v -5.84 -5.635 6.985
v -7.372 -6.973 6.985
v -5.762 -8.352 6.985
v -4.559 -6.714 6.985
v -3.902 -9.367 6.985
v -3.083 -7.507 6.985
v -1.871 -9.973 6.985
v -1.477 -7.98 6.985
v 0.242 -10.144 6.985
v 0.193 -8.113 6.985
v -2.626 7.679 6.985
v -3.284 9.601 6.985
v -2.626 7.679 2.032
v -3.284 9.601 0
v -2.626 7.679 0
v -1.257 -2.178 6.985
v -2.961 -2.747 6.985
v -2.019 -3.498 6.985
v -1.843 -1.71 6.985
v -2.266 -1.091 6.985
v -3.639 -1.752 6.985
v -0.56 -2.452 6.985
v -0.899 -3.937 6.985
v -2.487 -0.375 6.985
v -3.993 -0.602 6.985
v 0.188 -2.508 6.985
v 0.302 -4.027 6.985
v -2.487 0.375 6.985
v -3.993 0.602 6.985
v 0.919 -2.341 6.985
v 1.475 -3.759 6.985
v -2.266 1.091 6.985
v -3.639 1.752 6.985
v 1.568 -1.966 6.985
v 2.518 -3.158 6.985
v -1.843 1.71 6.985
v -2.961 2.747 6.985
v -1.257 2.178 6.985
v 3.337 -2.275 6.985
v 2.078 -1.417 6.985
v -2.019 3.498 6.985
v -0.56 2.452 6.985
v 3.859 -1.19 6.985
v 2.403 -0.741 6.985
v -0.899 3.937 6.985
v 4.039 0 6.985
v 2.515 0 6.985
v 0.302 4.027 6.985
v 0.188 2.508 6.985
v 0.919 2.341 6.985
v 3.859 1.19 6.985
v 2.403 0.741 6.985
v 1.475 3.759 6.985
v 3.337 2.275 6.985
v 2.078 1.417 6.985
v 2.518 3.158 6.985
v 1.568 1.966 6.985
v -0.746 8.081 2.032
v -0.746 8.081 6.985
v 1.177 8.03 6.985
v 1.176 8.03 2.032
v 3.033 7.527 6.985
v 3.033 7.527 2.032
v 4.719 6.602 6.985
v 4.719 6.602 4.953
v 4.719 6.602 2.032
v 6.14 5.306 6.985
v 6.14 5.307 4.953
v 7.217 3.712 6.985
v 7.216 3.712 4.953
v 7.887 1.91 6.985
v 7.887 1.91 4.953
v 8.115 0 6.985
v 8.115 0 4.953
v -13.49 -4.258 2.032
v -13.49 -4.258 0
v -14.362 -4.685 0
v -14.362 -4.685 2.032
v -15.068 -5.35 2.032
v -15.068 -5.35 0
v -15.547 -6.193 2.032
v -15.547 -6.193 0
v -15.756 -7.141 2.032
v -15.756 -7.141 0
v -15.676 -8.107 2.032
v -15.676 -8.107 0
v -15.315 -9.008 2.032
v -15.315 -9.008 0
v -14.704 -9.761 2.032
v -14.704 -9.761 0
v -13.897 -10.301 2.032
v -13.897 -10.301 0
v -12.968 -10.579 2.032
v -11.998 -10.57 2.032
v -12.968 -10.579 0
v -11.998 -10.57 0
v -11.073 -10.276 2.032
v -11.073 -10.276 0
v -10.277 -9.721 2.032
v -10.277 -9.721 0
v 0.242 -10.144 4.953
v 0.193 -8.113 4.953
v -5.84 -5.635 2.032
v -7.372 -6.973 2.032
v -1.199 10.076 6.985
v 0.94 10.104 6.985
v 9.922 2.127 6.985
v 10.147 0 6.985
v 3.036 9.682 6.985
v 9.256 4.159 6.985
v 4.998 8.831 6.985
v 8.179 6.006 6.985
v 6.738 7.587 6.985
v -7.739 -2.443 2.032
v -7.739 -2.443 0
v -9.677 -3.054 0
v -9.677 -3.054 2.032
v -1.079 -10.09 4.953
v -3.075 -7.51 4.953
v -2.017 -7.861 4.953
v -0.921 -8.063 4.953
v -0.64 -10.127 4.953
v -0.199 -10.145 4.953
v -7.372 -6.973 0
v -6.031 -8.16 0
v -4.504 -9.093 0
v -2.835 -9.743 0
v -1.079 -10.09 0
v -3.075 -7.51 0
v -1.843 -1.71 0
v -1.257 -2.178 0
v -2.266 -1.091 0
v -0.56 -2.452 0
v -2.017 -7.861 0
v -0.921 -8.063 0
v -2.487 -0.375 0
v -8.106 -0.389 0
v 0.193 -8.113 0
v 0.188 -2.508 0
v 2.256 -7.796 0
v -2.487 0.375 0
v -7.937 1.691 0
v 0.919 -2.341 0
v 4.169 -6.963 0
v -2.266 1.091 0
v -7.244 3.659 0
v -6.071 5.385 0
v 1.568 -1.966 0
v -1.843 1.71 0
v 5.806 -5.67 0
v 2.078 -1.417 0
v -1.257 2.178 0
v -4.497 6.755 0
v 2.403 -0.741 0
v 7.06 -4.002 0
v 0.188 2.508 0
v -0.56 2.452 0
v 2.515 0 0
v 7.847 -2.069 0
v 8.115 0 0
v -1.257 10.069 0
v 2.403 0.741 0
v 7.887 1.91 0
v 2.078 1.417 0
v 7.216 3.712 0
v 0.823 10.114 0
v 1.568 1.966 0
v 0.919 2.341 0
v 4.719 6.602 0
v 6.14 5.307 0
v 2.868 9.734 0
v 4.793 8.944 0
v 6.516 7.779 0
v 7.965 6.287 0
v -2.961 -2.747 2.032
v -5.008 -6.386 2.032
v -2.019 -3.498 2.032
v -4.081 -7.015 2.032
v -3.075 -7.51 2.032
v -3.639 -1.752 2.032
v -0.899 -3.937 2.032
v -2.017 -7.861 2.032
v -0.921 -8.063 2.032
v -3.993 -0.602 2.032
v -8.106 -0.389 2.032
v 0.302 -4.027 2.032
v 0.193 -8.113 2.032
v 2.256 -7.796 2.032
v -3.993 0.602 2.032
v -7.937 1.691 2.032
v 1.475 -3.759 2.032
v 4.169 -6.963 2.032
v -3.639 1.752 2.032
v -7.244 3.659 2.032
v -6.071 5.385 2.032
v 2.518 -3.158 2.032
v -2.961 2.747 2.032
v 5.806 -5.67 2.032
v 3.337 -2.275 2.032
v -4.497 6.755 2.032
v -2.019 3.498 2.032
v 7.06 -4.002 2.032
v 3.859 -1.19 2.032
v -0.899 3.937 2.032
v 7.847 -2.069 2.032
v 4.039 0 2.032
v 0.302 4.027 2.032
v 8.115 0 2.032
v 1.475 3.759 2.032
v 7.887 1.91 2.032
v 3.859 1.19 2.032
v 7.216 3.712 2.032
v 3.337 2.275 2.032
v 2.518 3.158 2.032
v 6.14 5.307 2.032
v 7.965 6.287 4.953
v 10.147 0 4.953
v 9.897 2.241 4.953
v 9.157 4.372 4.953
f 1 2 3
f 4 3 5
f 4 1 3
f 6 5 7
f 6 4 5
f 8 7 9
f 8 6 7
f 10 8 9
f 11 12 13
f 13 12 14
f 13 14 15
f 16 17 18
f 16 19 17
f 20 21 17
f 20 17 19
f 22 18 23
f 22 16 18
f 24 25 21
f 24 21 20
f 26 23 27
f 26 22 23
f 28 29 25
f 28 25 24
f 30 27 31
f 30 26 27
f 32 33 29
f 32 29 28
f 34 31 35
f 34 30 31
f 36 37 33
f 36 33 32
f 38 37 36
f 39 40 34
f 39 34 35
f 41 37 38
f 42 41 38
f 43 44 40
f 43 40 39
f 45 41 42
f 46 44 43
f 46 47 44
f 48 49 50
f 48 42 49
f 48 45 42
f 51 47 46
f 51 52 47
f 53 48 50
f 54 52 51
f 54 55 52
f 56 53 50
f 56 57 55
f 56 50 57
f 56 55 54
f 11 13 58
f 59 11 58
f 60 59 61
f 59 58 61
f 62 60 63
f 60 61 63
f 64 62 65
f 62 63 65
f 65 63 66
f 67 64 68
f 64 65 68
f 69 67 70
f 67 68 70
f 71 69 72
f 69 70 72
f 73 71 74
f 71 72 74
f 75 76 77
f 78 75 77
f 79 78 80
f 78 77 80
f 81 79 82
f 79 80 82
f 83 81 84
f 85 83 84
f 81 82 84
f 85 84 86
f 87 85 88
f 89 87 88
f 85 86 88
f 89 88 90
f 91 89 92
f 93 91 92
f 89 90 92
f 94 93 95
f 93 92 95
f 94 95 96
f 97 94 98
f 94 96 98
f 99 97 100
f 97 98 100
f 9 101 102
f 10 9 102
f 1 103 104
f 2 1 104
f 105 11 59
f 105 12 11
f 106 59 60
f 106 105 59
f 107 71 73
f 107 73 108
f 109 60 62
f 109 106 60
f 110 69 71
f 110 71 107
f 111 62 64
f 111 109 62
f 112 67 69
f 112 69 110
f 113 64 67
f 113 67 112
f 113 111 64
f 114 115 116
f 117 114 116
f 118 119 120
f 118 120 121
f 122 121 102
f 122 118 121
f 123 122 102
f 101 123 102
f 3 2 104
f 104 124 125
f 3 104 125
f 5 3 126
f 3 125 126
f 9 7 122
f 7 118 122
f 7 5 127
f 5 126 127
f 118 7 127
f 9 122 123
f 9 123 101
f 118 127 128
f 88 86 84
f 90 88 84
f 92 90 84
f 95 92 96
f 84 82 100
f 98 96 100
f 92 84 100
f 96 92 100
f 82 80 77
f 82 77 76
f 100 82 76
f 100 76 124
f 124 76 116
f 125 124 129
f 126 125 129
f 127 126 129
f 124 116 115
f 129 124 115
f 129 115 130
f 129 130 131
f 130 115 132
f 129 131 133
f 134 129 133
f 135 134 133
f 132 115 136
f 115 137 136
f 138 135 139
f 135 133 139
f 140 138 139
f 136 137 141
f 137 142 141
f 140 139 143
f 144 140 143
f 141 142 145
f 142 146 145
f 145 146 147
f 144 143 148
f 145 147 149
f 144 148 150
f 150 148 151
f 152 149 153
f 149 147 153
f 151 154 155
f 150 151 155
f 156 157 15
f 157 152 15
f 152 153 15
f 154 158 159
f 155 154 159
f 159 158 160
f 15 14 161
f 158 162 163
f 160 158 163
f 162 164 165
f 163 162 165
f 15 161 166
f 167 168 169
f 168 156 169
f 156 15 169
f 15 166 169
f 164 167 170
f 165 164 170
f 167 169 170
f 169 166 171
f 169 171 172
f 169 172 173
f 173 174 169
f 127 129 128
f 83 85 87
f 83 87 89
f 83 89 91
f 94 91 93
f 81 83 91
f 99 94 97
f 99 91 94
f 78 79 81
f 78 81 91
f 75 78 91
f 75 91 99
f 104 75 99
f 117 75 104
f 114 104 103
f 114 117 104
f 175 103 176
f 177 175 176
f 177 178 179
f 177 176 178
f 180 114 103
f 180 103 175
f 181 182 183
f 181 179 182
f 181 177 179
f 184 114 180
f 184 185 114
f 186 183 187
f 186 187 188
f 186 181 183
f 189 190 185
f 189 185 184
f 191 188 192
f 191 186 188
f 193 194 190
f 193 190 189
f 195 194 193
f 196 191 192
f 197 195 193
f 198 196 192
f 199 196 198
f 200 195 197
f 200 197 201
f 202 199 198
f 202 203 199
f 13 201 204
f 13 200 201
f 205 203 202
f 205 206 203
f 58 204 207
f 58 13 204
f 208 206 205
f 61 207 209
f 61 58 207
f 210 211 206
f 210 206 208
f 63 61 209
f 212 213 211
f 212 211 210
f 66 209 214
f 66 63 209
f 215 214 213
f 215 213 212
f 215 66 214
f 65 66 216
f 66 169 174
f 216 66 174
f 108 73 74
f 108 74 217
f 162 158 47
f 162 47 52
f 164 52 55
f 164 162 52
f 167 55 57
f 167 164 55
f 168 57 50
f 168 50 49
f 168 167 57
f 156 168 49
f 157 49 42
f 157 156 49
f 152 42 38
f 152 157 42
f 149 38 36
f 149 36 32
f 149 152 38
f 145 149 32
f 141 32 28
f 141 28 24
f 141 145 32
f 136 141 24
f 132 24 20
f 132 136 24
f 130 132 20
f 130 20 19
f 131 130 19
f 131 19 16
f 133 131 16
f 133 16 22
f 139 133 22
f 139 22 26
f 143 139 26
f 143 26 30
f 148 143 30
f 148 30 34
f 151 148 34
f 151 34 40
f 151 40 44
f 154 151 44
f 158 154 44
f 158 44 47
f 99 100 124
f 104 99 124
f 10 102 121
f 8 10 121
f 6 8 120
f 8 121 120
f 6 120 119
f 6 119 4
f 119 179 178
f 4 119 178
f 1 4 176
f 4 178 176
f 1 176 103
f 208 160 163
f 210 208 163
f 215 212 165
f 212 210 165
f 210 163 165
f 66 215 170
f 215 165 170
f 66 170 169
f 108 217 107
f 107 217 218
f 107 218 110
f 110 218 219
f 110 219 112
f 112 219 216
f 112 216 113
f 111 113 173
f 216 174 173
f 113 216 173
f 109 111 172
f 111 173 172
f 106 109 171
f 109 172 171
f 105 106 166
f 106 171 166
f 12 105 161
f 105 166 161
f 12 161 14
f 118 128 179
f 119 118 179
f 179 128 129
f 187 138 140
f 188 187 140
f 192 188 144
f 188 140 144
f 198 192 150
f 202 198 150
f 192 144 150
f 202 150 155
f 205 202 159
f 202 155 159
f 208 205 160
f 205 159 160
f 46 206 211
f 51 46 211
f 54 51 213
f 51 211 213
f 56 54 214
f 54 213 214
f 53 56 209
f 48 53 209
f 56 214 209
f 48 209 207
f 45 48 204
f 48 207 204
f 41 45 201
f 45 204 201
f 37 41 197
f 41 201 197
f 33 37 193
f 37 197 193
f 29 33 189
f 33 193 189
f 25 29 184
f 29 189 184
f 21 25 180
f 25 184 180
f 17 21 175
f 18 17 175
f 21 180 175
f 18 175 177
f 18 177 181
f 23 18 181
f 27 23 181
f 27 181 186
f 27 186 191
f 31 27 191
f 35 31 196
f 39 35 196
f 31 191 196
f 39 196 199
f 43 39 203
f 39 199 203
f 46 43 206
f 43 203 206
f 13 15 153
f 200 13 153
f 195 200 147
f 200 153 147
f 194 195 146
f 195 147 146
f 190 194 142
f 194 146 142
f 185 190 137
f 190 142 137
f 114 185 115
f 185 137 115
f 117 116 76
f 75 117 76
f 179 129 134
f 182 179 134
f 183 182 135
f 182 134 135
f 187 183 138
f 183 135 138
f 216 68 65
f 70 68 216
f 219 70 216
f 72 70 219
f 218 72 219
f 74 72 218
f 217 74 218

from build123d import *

# Parameters (mm, degrees)
F0_R     = 2.5146
F1_DEPTH = 2.032
F2_R     = 4.0386
F2_R_2   = 2.5146
F3_DEPTH = 4.953
F5_DEPTH = 4.953


with BuildPart() as f1:
    # F0 (on Top) → F1 (new body)
    with BuildSketch(Plane.XY):
        with BuildLine():
            ThreePointArc((0.1932728669, -8.1129981936), (5.8063138645, -5.6696396179), (8.1153, 0))
            ThreePointArc((8.1153, 0), (4.7193819453, 6.6019336671), (-2.6262691705, 7.6785939035))
            ThreePointArc((-2.6262691705, 7.6785939035), (-7.243577354, 3.6590546875), (-7.7389628282, -2.4426519264))
            ThreePointArc((-7.7389628282, -2.4426519264), (-4.7193819453, -6.6019336671), (0.1932728669, -8.1129981936))
        make_face()
        Circle(F0_R, mode=Mode.SUBTRACT)
        with BuildLine():
            ThreePointArc((-2.6262691705, 7.6785939035), (4.7193819453, 6.6019336671), (8.1153, 0))
            Line((8.1153, 0), (10.1473, 0))
            ThreePointArc((10.1473, 0), (5.9010738252, 8.255), (-3.2838639549, 9.601246524))
            Line((-3.2838639549, 9.601246524), (-2.6262691705, 7.6785939035))
        make_face()
        with BuildLine():
            Line((0.241666699, -10.1444218414), (0.1932728669, -8.1129981936))
            ThreePointArc((0.1932728669, -8.1129981936), (-4.7193819453, -6.6019336671), (-7.7389628282, -2.4426519264))
            Line((-7.7389628282, -2.4426519264), (-9.6767312985, -3.0542705621))
            ThreePointArc((-9.6767312985, -3.0542705621), (-8.7465221148, -5.1445163217), (-7.3716789291, -6.9732379177))
            ThreePointArc((-7.3716789291, -6.9732379177), (-3.9017137862, -9.3671941808), (0.241666699, -10.1444218414))
        make_face()
        with BuildLine():
            ThreePointArc((-7.3716789291, -6.9732379177), (-8.7465221148, -5.1445163217), (-9.6767312985, -3.0542705621))
            Line((-9.6767312985, -3.0542705621), (-13.4904375036, -4.2579921738))
            ThreePointArc((-13.4904375036, -4.2579921738), (-15.3146238281, -9.0077325834), (-10.2769386502, -9.7214676552))
            Line((-10.2769386502, -9.7214676552), (-7.3716789291, -6.9732379177))
        make_face()
    extrude(amount=F1_DEPTH)

    # F2 (on face) → F3 (join)
    with BuildSketch(Plane.XY.offset(2.032)):
        with BuildLine():
            Line((-5.8403095484, -5.6346143141), (-7.3716789291, -6.9732379177))
            ThreePointArc((-7.3716789291, -6.9732379177), (-3.9017137862, -9.3671941808), (0.241666699, -10.1444218414))
            Line((0.241666699, -10.1444218414), (0.1932728669, -8.1129981936))
            ThreePointArc((0.1932728669, -8.1129981936), (-3.0834805795, -7.5066797991), (-5.8403095484, -5.6346143141))
        make_face()
        Circle(F2_R)
        Circle(F2_R_2, mode=Mode.SUBTRACT)
        with BuildLine():
            ThreePointArc((-2.6262691705, 7.6785939035), (4.7193819453, 6.6019336671), (8.1153, 0))
            Line((8.1153, 0), (10.1473, 0))
            ThreePointArc((10.1473, 0), (5.9010738252, 8.255), (-3.2838639549, 9.601246524))
            Line((-3.2838639549, 9.601246524), (-2.6262691705, 7.6785939035))
        make_face()
    extrude(amount=F3_DEPTH)

    # F4 (on face) → F5 (cut)
    with BuildSketch(Plane(origin=(0, 0, 0), x_dir=(1, 0, 0), z_dir=(0, 0, -1))):
        with BuildLine():
            ThreePointArc((-3.0752344649, 7.5100617225), (-1.4721782365, 7.9806506834), (0.1932728669, 8.1129981936))
            Line((0.1932728669, 8.1129981936), (0.241666699, 10.1444218414))
            ThreePointArc((0.241666699, 10.1444218414), (-0.4196244465, 10.1386198574), (-1.079133301, 10.0897556268))
            Line((-1.079133301, 10.0897556268), (-3.0752344649, 7.5100617225))
        make_face()
        with BuildLine():
            ThreePointArc((7.9651252816, -6.2868494923), (9.5862456953, -3.3274), (10.1473, 0))
            Line((10.1473, 0), (8.1153, 0))
            ThreePointArc((8.1153, 0), (7.2163466693, -3.7124701802), (4.7186455722, -6.6024600002))
            Line((4.7186455722, -6.6024600002), (7.9651252816, -6.2868494923))
        make_face()
    extrude(amount=-F5_DEPTH, mode=Mode.SUBTRACT)


solid = f1.part
